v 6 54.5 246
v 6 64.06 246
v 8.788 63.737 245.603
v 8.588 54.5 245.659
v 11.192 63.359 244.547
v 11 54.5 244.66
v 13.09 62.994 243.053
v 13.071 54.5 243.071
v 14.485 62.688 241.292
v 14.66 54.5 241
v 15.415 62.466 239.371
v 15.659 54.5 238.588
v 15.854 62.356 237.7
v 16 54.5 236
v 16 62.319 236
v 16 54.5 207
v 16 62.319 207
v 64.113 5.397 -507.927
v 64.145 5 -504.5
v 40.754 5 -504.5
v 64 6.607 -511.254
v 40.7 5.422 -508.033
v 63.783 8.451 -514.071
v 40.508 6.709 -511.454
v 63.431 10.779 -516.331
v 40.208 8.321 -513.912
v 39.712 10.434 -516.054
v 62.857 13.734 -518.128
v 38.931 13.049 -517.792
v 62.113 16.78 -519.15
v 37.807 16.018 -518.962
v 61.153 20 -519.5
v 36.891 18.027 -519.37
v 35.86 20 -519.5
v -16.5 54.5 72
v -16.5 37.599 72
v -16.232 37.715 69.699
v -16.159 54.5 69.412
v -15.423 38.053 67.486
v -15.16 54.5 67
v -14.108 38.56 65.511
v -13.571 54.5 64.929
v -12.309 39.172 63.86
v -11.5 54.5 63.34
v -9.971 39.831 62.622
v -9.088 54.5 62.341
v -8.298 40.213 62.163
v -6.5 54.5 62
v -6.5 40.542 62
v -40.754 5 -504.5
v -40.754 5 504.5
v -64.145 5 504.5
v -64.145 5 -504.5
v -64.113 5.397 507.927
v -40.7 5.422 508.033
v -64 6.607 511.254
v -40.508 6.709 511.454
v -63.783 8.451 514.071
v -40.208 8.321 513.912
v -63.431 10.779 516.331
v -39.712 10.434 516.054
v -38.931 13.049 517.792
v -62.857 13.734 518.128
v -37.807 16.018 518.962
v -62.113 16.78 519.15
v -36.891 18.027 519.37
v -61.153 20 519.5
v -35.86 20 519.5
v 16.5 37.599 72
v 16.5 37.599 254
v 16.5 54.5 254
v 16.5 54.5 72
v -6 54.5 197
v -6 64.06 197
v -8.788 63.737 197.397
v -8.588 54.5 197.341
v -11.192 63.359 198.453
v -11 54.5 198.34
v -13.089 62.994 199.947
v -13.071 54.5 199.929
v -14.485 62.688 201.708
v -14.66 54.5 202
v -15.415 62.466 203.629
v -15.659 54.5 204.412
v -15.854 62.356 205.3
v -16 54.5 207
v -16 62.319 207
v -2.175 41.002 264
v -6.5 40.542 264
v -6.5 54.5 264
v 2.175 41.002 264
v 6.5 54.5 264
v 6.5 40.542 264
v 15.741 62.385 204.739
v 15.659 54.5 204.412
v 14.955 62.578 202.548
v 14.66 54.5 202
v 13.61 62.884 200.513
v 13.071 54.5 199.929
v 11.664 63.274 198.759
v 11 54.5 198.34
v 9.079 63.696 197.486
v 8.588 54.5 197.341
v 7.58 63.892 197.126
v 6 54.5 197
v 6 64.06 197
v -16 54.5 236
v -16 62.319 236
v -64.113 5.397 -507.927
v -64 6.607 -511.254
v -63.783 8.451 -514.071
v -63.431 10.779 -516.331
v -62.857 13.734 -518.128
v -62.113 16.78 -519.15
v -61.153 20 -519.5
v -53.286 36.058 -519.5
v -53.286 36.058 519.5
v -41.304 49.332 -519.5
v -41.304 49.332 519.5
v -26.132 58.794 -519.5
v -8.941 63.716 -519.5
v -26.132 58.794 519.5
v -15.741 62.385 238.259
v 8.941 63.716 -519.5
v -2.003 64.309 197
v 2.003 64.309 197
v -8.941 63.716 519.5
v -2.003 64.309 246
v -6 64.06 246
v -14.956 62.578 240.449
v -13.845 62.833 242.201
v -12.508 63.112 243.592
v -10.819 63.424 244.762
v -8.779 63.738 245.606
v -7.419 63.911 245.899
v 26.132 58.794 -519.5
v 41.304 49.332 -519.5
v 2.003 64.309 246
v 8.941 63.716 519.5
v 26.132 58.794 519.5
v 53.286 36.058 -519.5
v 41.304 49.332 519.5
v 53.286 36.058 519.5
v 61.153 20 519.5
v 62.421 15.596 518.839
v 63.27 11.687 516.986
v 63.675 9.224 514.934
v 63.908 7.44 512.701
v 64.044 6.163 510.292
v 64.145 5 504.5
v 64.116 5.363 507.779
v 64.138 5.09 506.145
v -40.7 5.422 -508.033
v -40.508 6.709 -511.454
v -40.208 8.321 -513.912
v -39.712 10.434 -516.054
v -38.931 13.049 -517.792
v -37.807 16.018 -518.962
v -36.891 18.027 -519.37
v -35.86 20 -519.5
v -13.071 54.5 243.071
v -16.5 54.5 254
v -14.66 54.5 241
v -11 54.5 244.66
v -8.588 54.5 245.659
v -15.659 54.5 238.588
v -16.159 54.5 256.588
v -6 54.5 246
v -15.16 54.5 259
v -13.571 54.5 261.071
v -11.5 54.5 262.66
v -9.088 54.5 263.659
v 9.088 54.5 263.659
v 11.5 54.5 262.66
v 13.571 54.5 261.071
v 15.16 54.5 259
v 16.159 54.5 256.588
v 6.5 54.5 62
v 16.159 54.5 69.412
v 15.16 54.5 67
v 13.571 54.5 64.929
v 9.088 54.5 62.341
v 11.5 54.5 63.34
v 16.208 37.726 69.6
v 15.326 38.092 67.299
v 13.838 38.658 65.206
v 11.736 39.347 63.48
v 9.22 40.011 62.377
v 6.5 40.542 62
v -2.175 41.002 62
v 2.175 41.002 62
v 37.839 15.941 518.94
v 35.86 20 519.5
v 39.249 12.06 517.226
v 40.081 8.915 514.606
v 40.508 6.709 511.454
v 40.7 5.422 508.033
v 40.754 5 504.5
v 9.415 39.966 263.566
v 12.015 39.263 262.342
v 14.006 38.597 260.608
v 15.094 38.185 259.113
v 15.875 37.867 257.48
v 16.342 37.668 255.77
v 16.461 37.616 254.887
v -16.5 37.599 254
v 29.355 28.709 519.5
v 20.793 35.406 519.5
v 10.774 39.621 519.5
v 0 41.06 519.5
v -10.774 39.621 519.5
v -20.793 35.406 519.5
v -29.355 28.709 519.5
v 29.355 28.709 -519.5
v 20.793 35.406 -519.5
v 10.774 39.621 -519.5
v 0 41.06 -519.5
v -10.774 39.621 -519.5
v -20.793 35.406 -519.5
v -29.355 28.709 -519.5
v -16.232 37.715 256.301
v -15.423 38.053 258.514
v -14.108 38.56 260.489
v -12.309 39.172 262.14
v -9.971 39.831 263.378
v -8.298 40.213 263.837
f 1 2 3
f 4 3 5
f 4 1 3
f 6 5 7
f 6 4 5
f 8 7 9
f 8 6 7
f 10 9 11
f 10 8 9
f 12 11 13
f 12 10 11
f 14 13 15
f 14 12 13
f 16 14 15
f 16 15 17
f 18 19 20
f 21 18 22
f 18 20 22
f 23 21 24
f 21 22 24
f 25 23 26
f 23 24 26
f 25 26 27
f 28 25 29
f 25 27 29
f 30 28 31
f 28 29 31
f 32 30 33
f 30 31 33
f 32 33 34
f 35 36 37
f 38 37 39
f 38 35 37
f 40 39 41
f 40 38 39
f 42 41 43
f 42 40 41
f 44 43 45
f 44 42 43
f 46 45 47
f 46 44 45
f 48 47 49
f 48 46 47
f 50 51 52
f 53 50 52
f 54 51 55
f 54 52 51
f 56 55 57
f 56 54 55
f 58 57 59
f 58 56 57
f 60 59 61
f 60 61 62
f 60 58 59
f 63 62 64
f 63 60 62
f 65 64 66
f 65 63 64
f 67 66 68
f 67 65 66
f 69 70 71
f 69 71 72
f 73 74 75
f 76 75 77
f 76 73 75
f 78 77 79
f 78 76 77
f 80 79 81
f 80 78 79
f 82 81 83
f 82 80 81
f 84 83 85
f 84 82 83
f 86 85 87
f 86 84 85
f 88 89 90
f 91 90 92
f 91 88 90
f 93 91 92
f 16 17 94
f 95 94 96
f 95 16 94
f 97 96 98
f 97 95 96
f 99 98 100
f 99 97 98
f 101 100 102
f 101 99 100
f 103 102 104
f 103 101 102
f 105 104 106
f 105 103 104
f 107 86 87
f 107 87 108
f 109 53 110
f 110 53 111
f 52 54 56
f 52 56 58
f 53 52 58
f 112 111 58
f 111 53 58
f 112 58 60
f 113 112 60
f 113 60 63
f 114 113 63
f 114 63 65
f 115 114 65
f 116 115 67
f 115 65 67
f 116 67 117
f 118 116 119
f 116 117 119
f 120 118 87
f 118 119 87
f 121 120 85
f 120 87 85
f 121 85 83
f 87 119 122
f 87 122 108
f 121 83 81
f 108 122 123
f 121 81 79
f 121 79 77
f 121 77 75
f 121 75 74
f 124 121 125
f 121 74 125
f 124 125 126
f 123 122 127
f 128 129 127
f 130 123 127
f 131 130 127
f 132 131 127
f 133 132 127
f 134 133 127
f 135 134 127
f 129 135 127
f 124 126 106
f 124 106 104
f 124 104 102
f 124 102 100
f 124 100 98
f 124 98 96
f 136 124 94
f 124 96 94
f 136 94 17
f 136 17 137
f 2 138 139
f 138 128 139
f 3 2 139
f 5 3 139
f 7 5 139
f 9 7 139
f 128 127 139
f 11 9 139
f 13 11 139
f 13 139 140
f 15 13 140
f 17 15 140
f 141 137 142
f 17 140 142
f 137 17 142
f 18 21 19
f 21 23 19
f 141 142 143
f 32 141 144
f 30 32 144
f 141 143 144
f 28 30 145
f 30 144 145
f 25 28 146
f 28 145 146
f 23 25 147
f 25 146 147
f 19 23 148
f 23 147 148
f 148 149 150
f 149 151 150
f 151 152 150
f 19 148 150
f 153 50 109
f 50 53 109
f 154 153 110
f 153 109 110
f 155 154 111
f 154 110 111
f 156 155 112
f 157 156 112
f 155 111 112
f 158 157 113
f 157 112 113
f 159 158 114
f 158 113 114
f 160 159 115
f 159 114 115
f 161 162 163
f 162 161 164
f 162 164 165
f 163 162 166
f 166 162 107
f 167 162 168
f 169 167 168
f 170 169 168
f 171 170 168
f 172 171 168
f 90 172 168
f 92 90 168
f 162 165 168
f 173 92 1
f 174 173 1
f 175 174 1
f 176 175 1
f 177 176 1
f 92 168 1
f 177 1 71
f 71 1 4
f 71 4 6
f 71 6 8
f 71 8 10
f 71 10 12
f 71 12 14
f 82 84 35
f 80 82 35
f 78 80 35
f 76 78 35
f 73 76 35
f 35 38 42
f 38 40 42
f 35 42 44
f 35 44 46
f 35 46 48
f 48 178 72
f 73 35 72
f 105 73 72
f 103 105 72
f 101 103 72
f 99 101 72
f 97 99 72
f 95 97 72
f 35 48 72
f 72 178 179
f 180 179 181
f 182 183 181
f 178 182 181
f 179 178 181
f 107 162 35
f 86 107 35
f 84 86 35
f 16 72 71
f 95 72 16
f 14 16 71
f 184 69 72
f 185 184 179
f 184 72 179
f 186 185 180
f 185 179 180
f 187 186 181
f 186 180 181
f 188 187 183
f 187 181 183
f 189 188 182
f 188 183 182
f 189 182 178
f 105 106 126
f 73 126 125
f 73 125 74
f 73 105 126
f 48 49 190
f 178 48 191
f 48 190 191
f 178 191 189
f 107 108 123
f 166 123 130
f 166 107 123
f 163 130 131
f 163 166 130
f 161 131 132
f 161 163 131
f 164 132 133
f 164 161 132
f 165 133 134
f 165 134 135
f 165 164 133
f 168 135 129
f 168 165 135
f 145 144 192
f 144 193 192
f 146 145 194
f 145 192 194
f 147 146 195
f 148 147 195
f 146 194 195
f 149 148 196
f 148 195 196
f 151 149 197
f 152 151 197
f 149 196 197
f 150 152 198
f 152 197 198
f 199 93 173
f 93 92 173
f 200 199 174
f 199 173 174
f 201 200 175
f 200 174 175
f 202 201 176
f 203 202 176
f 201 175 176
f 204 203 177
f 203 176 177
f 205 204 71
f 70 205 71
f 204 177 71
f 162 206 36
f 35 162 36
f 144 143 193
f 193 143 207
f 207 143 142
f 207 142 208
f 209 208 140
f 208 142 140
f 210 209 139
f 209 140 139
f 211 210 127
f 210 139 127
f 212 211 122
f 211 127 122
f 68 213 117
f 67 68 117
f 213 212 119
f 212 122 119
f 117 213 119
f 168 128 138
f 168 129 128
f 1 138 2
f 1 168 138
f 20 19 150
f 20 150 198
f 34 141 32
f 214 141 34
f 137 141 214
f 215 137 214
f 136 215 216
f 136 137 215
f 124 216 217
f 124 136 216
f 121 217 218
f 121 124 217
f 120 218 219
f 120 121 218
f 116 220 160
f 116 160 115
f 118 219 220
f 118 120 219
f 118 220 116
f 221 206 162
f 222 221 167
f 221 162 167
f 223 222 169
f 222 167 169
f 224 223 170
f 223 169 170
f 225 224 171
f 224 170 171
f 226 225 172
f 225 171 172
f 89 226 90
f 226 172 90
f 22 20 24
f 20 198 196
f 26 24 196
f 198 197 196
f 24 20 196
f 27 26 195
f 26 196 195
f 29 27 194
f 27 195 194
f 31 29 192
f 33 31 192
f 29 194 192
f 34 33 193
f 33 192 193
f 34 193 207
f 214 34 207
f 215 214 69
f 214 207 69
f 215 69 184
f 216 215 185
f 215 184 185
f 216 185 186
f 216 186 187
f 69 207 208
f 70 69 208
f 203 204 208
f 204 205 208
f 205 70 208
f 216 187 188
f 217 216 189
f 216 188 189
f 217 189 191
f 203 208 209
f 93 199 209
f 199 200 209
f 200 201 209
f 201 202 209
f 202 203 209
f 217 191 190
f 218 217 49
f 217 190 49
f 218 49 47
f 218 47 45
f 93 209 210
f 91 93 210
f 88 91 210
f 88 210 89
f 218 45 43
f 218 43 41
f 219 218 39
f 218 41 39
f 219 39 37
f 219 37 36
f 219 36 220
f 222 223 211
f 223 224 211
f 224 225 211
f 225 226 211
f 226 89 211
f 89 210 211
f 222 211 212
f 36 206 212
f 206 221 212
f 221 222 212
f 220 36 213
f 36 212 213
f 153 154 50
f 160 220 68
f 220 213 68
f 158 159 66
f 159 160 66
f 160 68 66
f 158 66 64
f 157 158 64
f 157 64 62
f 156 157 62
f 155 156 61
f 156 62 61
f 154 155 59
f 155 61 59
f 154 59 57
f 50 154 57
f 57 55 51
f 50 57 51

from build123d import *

# Parameters (mm, degrees)
BOSS_EXTRUDE1_DEPTH = 519.5
FILLET1_R           = 15
SKETCH2_W           = 33
SKETCH2_H           = 202
CUT_EXTRUDE1_DEPTH  = 54.5
FILLET2_R           = 10
CUT_EXTRUDE2_DEPTH  = 60.3400001


with BuildPart() as part:
    # Sketch1 → Boss-Extrude1 (new body, symmetric)
    with BuildSketch(Plane.XY):
        with BuildLine():
            Line((-40.754430434, 5), (-64.145425402, 5))
            ThreePointArc((-64.145425402, 5), (0, 64.34), (64.145425402, 5))
            Line((64.145425402, 5), (40.754430434, 5))
            ThreePointArc((40.754430434, 5), (0, 41.06), (-40.754430434, 5))
        make_face()
    extrude(amount=BOSS_EXTRUDE1_DEPTH, both=True)

    # Fillet1
    fillet1_edges = [part.edges().sort_by_distance(p)[0] for p in [
        (-52.449927918, 5, 519.5),
        (-52.449927918, 5, -519.5),
        (52.449927918, 5, -519.5),
        (52.449927918, 5, 519.5),
    ]]
    fillet(fillet1_edges, radius=FILLET1_R)

    # Sketch2 → Cut-Extrude1 (cut)
    with BuildSketch(Plane(origin=(0, 0, 0), x_dir=(1, 0, 0), z_dir=(0, 1, 0))):
        with Locations((0, -163)):
            Rectangle(SKETCH2_W, SKETCH2_H)
    extrude(amount=CUT_EXTRUDE1_DEPTH, mode=Mode.SUBTRACT)

    # Fillet2
    fillet2_edges = [part.edges().sort_by_distance(p)[0] for p in [
        (-16.5, 46.049425523, 62),
        (-16.5, 46.049425523, 264),
        (16.5, 46.049425523, 264),
        (16.5, 46.049425523, 62),
    ]]
    fillet(fillet2_edges, radius=FILLET2_R)

    # Sketch3 → Cut-Extrude2 (cut, through all)
    with BuildSketch(Plane.XZ.offset(-5)):
        with BuildLine():
            Line((-5.999925402, 246), (6.000074598, 246))
            ThreePointArc((6.000074598, 246), (13.07114241, 243.071067812), (16.000074598, 236))
            Line((16.000074598, 236), (16.000074598, 207))
            ThreePointArc((16.000074598, 207), (13.07114241, 199.928932188), (6.000074598, 197))
            Line((6.000074598, 197), (-5.999925402, 197))
            ThreePointArc((-5.999925402, 197), (-13.070993214, 199.928932188), (-15.999925402, 207))
            Line((-15.999925402, 207), (-15.999925402, 236))
            ThreePointArc((-15.999925402, 236), (-13.070993214, 243.071067812), (-5.999925402, 246))
        make_face()
    extrude(amount=-CUT_EXTRUDE2_DEPTH, mode=Mode.SUBTRACT)


solid = part.part
